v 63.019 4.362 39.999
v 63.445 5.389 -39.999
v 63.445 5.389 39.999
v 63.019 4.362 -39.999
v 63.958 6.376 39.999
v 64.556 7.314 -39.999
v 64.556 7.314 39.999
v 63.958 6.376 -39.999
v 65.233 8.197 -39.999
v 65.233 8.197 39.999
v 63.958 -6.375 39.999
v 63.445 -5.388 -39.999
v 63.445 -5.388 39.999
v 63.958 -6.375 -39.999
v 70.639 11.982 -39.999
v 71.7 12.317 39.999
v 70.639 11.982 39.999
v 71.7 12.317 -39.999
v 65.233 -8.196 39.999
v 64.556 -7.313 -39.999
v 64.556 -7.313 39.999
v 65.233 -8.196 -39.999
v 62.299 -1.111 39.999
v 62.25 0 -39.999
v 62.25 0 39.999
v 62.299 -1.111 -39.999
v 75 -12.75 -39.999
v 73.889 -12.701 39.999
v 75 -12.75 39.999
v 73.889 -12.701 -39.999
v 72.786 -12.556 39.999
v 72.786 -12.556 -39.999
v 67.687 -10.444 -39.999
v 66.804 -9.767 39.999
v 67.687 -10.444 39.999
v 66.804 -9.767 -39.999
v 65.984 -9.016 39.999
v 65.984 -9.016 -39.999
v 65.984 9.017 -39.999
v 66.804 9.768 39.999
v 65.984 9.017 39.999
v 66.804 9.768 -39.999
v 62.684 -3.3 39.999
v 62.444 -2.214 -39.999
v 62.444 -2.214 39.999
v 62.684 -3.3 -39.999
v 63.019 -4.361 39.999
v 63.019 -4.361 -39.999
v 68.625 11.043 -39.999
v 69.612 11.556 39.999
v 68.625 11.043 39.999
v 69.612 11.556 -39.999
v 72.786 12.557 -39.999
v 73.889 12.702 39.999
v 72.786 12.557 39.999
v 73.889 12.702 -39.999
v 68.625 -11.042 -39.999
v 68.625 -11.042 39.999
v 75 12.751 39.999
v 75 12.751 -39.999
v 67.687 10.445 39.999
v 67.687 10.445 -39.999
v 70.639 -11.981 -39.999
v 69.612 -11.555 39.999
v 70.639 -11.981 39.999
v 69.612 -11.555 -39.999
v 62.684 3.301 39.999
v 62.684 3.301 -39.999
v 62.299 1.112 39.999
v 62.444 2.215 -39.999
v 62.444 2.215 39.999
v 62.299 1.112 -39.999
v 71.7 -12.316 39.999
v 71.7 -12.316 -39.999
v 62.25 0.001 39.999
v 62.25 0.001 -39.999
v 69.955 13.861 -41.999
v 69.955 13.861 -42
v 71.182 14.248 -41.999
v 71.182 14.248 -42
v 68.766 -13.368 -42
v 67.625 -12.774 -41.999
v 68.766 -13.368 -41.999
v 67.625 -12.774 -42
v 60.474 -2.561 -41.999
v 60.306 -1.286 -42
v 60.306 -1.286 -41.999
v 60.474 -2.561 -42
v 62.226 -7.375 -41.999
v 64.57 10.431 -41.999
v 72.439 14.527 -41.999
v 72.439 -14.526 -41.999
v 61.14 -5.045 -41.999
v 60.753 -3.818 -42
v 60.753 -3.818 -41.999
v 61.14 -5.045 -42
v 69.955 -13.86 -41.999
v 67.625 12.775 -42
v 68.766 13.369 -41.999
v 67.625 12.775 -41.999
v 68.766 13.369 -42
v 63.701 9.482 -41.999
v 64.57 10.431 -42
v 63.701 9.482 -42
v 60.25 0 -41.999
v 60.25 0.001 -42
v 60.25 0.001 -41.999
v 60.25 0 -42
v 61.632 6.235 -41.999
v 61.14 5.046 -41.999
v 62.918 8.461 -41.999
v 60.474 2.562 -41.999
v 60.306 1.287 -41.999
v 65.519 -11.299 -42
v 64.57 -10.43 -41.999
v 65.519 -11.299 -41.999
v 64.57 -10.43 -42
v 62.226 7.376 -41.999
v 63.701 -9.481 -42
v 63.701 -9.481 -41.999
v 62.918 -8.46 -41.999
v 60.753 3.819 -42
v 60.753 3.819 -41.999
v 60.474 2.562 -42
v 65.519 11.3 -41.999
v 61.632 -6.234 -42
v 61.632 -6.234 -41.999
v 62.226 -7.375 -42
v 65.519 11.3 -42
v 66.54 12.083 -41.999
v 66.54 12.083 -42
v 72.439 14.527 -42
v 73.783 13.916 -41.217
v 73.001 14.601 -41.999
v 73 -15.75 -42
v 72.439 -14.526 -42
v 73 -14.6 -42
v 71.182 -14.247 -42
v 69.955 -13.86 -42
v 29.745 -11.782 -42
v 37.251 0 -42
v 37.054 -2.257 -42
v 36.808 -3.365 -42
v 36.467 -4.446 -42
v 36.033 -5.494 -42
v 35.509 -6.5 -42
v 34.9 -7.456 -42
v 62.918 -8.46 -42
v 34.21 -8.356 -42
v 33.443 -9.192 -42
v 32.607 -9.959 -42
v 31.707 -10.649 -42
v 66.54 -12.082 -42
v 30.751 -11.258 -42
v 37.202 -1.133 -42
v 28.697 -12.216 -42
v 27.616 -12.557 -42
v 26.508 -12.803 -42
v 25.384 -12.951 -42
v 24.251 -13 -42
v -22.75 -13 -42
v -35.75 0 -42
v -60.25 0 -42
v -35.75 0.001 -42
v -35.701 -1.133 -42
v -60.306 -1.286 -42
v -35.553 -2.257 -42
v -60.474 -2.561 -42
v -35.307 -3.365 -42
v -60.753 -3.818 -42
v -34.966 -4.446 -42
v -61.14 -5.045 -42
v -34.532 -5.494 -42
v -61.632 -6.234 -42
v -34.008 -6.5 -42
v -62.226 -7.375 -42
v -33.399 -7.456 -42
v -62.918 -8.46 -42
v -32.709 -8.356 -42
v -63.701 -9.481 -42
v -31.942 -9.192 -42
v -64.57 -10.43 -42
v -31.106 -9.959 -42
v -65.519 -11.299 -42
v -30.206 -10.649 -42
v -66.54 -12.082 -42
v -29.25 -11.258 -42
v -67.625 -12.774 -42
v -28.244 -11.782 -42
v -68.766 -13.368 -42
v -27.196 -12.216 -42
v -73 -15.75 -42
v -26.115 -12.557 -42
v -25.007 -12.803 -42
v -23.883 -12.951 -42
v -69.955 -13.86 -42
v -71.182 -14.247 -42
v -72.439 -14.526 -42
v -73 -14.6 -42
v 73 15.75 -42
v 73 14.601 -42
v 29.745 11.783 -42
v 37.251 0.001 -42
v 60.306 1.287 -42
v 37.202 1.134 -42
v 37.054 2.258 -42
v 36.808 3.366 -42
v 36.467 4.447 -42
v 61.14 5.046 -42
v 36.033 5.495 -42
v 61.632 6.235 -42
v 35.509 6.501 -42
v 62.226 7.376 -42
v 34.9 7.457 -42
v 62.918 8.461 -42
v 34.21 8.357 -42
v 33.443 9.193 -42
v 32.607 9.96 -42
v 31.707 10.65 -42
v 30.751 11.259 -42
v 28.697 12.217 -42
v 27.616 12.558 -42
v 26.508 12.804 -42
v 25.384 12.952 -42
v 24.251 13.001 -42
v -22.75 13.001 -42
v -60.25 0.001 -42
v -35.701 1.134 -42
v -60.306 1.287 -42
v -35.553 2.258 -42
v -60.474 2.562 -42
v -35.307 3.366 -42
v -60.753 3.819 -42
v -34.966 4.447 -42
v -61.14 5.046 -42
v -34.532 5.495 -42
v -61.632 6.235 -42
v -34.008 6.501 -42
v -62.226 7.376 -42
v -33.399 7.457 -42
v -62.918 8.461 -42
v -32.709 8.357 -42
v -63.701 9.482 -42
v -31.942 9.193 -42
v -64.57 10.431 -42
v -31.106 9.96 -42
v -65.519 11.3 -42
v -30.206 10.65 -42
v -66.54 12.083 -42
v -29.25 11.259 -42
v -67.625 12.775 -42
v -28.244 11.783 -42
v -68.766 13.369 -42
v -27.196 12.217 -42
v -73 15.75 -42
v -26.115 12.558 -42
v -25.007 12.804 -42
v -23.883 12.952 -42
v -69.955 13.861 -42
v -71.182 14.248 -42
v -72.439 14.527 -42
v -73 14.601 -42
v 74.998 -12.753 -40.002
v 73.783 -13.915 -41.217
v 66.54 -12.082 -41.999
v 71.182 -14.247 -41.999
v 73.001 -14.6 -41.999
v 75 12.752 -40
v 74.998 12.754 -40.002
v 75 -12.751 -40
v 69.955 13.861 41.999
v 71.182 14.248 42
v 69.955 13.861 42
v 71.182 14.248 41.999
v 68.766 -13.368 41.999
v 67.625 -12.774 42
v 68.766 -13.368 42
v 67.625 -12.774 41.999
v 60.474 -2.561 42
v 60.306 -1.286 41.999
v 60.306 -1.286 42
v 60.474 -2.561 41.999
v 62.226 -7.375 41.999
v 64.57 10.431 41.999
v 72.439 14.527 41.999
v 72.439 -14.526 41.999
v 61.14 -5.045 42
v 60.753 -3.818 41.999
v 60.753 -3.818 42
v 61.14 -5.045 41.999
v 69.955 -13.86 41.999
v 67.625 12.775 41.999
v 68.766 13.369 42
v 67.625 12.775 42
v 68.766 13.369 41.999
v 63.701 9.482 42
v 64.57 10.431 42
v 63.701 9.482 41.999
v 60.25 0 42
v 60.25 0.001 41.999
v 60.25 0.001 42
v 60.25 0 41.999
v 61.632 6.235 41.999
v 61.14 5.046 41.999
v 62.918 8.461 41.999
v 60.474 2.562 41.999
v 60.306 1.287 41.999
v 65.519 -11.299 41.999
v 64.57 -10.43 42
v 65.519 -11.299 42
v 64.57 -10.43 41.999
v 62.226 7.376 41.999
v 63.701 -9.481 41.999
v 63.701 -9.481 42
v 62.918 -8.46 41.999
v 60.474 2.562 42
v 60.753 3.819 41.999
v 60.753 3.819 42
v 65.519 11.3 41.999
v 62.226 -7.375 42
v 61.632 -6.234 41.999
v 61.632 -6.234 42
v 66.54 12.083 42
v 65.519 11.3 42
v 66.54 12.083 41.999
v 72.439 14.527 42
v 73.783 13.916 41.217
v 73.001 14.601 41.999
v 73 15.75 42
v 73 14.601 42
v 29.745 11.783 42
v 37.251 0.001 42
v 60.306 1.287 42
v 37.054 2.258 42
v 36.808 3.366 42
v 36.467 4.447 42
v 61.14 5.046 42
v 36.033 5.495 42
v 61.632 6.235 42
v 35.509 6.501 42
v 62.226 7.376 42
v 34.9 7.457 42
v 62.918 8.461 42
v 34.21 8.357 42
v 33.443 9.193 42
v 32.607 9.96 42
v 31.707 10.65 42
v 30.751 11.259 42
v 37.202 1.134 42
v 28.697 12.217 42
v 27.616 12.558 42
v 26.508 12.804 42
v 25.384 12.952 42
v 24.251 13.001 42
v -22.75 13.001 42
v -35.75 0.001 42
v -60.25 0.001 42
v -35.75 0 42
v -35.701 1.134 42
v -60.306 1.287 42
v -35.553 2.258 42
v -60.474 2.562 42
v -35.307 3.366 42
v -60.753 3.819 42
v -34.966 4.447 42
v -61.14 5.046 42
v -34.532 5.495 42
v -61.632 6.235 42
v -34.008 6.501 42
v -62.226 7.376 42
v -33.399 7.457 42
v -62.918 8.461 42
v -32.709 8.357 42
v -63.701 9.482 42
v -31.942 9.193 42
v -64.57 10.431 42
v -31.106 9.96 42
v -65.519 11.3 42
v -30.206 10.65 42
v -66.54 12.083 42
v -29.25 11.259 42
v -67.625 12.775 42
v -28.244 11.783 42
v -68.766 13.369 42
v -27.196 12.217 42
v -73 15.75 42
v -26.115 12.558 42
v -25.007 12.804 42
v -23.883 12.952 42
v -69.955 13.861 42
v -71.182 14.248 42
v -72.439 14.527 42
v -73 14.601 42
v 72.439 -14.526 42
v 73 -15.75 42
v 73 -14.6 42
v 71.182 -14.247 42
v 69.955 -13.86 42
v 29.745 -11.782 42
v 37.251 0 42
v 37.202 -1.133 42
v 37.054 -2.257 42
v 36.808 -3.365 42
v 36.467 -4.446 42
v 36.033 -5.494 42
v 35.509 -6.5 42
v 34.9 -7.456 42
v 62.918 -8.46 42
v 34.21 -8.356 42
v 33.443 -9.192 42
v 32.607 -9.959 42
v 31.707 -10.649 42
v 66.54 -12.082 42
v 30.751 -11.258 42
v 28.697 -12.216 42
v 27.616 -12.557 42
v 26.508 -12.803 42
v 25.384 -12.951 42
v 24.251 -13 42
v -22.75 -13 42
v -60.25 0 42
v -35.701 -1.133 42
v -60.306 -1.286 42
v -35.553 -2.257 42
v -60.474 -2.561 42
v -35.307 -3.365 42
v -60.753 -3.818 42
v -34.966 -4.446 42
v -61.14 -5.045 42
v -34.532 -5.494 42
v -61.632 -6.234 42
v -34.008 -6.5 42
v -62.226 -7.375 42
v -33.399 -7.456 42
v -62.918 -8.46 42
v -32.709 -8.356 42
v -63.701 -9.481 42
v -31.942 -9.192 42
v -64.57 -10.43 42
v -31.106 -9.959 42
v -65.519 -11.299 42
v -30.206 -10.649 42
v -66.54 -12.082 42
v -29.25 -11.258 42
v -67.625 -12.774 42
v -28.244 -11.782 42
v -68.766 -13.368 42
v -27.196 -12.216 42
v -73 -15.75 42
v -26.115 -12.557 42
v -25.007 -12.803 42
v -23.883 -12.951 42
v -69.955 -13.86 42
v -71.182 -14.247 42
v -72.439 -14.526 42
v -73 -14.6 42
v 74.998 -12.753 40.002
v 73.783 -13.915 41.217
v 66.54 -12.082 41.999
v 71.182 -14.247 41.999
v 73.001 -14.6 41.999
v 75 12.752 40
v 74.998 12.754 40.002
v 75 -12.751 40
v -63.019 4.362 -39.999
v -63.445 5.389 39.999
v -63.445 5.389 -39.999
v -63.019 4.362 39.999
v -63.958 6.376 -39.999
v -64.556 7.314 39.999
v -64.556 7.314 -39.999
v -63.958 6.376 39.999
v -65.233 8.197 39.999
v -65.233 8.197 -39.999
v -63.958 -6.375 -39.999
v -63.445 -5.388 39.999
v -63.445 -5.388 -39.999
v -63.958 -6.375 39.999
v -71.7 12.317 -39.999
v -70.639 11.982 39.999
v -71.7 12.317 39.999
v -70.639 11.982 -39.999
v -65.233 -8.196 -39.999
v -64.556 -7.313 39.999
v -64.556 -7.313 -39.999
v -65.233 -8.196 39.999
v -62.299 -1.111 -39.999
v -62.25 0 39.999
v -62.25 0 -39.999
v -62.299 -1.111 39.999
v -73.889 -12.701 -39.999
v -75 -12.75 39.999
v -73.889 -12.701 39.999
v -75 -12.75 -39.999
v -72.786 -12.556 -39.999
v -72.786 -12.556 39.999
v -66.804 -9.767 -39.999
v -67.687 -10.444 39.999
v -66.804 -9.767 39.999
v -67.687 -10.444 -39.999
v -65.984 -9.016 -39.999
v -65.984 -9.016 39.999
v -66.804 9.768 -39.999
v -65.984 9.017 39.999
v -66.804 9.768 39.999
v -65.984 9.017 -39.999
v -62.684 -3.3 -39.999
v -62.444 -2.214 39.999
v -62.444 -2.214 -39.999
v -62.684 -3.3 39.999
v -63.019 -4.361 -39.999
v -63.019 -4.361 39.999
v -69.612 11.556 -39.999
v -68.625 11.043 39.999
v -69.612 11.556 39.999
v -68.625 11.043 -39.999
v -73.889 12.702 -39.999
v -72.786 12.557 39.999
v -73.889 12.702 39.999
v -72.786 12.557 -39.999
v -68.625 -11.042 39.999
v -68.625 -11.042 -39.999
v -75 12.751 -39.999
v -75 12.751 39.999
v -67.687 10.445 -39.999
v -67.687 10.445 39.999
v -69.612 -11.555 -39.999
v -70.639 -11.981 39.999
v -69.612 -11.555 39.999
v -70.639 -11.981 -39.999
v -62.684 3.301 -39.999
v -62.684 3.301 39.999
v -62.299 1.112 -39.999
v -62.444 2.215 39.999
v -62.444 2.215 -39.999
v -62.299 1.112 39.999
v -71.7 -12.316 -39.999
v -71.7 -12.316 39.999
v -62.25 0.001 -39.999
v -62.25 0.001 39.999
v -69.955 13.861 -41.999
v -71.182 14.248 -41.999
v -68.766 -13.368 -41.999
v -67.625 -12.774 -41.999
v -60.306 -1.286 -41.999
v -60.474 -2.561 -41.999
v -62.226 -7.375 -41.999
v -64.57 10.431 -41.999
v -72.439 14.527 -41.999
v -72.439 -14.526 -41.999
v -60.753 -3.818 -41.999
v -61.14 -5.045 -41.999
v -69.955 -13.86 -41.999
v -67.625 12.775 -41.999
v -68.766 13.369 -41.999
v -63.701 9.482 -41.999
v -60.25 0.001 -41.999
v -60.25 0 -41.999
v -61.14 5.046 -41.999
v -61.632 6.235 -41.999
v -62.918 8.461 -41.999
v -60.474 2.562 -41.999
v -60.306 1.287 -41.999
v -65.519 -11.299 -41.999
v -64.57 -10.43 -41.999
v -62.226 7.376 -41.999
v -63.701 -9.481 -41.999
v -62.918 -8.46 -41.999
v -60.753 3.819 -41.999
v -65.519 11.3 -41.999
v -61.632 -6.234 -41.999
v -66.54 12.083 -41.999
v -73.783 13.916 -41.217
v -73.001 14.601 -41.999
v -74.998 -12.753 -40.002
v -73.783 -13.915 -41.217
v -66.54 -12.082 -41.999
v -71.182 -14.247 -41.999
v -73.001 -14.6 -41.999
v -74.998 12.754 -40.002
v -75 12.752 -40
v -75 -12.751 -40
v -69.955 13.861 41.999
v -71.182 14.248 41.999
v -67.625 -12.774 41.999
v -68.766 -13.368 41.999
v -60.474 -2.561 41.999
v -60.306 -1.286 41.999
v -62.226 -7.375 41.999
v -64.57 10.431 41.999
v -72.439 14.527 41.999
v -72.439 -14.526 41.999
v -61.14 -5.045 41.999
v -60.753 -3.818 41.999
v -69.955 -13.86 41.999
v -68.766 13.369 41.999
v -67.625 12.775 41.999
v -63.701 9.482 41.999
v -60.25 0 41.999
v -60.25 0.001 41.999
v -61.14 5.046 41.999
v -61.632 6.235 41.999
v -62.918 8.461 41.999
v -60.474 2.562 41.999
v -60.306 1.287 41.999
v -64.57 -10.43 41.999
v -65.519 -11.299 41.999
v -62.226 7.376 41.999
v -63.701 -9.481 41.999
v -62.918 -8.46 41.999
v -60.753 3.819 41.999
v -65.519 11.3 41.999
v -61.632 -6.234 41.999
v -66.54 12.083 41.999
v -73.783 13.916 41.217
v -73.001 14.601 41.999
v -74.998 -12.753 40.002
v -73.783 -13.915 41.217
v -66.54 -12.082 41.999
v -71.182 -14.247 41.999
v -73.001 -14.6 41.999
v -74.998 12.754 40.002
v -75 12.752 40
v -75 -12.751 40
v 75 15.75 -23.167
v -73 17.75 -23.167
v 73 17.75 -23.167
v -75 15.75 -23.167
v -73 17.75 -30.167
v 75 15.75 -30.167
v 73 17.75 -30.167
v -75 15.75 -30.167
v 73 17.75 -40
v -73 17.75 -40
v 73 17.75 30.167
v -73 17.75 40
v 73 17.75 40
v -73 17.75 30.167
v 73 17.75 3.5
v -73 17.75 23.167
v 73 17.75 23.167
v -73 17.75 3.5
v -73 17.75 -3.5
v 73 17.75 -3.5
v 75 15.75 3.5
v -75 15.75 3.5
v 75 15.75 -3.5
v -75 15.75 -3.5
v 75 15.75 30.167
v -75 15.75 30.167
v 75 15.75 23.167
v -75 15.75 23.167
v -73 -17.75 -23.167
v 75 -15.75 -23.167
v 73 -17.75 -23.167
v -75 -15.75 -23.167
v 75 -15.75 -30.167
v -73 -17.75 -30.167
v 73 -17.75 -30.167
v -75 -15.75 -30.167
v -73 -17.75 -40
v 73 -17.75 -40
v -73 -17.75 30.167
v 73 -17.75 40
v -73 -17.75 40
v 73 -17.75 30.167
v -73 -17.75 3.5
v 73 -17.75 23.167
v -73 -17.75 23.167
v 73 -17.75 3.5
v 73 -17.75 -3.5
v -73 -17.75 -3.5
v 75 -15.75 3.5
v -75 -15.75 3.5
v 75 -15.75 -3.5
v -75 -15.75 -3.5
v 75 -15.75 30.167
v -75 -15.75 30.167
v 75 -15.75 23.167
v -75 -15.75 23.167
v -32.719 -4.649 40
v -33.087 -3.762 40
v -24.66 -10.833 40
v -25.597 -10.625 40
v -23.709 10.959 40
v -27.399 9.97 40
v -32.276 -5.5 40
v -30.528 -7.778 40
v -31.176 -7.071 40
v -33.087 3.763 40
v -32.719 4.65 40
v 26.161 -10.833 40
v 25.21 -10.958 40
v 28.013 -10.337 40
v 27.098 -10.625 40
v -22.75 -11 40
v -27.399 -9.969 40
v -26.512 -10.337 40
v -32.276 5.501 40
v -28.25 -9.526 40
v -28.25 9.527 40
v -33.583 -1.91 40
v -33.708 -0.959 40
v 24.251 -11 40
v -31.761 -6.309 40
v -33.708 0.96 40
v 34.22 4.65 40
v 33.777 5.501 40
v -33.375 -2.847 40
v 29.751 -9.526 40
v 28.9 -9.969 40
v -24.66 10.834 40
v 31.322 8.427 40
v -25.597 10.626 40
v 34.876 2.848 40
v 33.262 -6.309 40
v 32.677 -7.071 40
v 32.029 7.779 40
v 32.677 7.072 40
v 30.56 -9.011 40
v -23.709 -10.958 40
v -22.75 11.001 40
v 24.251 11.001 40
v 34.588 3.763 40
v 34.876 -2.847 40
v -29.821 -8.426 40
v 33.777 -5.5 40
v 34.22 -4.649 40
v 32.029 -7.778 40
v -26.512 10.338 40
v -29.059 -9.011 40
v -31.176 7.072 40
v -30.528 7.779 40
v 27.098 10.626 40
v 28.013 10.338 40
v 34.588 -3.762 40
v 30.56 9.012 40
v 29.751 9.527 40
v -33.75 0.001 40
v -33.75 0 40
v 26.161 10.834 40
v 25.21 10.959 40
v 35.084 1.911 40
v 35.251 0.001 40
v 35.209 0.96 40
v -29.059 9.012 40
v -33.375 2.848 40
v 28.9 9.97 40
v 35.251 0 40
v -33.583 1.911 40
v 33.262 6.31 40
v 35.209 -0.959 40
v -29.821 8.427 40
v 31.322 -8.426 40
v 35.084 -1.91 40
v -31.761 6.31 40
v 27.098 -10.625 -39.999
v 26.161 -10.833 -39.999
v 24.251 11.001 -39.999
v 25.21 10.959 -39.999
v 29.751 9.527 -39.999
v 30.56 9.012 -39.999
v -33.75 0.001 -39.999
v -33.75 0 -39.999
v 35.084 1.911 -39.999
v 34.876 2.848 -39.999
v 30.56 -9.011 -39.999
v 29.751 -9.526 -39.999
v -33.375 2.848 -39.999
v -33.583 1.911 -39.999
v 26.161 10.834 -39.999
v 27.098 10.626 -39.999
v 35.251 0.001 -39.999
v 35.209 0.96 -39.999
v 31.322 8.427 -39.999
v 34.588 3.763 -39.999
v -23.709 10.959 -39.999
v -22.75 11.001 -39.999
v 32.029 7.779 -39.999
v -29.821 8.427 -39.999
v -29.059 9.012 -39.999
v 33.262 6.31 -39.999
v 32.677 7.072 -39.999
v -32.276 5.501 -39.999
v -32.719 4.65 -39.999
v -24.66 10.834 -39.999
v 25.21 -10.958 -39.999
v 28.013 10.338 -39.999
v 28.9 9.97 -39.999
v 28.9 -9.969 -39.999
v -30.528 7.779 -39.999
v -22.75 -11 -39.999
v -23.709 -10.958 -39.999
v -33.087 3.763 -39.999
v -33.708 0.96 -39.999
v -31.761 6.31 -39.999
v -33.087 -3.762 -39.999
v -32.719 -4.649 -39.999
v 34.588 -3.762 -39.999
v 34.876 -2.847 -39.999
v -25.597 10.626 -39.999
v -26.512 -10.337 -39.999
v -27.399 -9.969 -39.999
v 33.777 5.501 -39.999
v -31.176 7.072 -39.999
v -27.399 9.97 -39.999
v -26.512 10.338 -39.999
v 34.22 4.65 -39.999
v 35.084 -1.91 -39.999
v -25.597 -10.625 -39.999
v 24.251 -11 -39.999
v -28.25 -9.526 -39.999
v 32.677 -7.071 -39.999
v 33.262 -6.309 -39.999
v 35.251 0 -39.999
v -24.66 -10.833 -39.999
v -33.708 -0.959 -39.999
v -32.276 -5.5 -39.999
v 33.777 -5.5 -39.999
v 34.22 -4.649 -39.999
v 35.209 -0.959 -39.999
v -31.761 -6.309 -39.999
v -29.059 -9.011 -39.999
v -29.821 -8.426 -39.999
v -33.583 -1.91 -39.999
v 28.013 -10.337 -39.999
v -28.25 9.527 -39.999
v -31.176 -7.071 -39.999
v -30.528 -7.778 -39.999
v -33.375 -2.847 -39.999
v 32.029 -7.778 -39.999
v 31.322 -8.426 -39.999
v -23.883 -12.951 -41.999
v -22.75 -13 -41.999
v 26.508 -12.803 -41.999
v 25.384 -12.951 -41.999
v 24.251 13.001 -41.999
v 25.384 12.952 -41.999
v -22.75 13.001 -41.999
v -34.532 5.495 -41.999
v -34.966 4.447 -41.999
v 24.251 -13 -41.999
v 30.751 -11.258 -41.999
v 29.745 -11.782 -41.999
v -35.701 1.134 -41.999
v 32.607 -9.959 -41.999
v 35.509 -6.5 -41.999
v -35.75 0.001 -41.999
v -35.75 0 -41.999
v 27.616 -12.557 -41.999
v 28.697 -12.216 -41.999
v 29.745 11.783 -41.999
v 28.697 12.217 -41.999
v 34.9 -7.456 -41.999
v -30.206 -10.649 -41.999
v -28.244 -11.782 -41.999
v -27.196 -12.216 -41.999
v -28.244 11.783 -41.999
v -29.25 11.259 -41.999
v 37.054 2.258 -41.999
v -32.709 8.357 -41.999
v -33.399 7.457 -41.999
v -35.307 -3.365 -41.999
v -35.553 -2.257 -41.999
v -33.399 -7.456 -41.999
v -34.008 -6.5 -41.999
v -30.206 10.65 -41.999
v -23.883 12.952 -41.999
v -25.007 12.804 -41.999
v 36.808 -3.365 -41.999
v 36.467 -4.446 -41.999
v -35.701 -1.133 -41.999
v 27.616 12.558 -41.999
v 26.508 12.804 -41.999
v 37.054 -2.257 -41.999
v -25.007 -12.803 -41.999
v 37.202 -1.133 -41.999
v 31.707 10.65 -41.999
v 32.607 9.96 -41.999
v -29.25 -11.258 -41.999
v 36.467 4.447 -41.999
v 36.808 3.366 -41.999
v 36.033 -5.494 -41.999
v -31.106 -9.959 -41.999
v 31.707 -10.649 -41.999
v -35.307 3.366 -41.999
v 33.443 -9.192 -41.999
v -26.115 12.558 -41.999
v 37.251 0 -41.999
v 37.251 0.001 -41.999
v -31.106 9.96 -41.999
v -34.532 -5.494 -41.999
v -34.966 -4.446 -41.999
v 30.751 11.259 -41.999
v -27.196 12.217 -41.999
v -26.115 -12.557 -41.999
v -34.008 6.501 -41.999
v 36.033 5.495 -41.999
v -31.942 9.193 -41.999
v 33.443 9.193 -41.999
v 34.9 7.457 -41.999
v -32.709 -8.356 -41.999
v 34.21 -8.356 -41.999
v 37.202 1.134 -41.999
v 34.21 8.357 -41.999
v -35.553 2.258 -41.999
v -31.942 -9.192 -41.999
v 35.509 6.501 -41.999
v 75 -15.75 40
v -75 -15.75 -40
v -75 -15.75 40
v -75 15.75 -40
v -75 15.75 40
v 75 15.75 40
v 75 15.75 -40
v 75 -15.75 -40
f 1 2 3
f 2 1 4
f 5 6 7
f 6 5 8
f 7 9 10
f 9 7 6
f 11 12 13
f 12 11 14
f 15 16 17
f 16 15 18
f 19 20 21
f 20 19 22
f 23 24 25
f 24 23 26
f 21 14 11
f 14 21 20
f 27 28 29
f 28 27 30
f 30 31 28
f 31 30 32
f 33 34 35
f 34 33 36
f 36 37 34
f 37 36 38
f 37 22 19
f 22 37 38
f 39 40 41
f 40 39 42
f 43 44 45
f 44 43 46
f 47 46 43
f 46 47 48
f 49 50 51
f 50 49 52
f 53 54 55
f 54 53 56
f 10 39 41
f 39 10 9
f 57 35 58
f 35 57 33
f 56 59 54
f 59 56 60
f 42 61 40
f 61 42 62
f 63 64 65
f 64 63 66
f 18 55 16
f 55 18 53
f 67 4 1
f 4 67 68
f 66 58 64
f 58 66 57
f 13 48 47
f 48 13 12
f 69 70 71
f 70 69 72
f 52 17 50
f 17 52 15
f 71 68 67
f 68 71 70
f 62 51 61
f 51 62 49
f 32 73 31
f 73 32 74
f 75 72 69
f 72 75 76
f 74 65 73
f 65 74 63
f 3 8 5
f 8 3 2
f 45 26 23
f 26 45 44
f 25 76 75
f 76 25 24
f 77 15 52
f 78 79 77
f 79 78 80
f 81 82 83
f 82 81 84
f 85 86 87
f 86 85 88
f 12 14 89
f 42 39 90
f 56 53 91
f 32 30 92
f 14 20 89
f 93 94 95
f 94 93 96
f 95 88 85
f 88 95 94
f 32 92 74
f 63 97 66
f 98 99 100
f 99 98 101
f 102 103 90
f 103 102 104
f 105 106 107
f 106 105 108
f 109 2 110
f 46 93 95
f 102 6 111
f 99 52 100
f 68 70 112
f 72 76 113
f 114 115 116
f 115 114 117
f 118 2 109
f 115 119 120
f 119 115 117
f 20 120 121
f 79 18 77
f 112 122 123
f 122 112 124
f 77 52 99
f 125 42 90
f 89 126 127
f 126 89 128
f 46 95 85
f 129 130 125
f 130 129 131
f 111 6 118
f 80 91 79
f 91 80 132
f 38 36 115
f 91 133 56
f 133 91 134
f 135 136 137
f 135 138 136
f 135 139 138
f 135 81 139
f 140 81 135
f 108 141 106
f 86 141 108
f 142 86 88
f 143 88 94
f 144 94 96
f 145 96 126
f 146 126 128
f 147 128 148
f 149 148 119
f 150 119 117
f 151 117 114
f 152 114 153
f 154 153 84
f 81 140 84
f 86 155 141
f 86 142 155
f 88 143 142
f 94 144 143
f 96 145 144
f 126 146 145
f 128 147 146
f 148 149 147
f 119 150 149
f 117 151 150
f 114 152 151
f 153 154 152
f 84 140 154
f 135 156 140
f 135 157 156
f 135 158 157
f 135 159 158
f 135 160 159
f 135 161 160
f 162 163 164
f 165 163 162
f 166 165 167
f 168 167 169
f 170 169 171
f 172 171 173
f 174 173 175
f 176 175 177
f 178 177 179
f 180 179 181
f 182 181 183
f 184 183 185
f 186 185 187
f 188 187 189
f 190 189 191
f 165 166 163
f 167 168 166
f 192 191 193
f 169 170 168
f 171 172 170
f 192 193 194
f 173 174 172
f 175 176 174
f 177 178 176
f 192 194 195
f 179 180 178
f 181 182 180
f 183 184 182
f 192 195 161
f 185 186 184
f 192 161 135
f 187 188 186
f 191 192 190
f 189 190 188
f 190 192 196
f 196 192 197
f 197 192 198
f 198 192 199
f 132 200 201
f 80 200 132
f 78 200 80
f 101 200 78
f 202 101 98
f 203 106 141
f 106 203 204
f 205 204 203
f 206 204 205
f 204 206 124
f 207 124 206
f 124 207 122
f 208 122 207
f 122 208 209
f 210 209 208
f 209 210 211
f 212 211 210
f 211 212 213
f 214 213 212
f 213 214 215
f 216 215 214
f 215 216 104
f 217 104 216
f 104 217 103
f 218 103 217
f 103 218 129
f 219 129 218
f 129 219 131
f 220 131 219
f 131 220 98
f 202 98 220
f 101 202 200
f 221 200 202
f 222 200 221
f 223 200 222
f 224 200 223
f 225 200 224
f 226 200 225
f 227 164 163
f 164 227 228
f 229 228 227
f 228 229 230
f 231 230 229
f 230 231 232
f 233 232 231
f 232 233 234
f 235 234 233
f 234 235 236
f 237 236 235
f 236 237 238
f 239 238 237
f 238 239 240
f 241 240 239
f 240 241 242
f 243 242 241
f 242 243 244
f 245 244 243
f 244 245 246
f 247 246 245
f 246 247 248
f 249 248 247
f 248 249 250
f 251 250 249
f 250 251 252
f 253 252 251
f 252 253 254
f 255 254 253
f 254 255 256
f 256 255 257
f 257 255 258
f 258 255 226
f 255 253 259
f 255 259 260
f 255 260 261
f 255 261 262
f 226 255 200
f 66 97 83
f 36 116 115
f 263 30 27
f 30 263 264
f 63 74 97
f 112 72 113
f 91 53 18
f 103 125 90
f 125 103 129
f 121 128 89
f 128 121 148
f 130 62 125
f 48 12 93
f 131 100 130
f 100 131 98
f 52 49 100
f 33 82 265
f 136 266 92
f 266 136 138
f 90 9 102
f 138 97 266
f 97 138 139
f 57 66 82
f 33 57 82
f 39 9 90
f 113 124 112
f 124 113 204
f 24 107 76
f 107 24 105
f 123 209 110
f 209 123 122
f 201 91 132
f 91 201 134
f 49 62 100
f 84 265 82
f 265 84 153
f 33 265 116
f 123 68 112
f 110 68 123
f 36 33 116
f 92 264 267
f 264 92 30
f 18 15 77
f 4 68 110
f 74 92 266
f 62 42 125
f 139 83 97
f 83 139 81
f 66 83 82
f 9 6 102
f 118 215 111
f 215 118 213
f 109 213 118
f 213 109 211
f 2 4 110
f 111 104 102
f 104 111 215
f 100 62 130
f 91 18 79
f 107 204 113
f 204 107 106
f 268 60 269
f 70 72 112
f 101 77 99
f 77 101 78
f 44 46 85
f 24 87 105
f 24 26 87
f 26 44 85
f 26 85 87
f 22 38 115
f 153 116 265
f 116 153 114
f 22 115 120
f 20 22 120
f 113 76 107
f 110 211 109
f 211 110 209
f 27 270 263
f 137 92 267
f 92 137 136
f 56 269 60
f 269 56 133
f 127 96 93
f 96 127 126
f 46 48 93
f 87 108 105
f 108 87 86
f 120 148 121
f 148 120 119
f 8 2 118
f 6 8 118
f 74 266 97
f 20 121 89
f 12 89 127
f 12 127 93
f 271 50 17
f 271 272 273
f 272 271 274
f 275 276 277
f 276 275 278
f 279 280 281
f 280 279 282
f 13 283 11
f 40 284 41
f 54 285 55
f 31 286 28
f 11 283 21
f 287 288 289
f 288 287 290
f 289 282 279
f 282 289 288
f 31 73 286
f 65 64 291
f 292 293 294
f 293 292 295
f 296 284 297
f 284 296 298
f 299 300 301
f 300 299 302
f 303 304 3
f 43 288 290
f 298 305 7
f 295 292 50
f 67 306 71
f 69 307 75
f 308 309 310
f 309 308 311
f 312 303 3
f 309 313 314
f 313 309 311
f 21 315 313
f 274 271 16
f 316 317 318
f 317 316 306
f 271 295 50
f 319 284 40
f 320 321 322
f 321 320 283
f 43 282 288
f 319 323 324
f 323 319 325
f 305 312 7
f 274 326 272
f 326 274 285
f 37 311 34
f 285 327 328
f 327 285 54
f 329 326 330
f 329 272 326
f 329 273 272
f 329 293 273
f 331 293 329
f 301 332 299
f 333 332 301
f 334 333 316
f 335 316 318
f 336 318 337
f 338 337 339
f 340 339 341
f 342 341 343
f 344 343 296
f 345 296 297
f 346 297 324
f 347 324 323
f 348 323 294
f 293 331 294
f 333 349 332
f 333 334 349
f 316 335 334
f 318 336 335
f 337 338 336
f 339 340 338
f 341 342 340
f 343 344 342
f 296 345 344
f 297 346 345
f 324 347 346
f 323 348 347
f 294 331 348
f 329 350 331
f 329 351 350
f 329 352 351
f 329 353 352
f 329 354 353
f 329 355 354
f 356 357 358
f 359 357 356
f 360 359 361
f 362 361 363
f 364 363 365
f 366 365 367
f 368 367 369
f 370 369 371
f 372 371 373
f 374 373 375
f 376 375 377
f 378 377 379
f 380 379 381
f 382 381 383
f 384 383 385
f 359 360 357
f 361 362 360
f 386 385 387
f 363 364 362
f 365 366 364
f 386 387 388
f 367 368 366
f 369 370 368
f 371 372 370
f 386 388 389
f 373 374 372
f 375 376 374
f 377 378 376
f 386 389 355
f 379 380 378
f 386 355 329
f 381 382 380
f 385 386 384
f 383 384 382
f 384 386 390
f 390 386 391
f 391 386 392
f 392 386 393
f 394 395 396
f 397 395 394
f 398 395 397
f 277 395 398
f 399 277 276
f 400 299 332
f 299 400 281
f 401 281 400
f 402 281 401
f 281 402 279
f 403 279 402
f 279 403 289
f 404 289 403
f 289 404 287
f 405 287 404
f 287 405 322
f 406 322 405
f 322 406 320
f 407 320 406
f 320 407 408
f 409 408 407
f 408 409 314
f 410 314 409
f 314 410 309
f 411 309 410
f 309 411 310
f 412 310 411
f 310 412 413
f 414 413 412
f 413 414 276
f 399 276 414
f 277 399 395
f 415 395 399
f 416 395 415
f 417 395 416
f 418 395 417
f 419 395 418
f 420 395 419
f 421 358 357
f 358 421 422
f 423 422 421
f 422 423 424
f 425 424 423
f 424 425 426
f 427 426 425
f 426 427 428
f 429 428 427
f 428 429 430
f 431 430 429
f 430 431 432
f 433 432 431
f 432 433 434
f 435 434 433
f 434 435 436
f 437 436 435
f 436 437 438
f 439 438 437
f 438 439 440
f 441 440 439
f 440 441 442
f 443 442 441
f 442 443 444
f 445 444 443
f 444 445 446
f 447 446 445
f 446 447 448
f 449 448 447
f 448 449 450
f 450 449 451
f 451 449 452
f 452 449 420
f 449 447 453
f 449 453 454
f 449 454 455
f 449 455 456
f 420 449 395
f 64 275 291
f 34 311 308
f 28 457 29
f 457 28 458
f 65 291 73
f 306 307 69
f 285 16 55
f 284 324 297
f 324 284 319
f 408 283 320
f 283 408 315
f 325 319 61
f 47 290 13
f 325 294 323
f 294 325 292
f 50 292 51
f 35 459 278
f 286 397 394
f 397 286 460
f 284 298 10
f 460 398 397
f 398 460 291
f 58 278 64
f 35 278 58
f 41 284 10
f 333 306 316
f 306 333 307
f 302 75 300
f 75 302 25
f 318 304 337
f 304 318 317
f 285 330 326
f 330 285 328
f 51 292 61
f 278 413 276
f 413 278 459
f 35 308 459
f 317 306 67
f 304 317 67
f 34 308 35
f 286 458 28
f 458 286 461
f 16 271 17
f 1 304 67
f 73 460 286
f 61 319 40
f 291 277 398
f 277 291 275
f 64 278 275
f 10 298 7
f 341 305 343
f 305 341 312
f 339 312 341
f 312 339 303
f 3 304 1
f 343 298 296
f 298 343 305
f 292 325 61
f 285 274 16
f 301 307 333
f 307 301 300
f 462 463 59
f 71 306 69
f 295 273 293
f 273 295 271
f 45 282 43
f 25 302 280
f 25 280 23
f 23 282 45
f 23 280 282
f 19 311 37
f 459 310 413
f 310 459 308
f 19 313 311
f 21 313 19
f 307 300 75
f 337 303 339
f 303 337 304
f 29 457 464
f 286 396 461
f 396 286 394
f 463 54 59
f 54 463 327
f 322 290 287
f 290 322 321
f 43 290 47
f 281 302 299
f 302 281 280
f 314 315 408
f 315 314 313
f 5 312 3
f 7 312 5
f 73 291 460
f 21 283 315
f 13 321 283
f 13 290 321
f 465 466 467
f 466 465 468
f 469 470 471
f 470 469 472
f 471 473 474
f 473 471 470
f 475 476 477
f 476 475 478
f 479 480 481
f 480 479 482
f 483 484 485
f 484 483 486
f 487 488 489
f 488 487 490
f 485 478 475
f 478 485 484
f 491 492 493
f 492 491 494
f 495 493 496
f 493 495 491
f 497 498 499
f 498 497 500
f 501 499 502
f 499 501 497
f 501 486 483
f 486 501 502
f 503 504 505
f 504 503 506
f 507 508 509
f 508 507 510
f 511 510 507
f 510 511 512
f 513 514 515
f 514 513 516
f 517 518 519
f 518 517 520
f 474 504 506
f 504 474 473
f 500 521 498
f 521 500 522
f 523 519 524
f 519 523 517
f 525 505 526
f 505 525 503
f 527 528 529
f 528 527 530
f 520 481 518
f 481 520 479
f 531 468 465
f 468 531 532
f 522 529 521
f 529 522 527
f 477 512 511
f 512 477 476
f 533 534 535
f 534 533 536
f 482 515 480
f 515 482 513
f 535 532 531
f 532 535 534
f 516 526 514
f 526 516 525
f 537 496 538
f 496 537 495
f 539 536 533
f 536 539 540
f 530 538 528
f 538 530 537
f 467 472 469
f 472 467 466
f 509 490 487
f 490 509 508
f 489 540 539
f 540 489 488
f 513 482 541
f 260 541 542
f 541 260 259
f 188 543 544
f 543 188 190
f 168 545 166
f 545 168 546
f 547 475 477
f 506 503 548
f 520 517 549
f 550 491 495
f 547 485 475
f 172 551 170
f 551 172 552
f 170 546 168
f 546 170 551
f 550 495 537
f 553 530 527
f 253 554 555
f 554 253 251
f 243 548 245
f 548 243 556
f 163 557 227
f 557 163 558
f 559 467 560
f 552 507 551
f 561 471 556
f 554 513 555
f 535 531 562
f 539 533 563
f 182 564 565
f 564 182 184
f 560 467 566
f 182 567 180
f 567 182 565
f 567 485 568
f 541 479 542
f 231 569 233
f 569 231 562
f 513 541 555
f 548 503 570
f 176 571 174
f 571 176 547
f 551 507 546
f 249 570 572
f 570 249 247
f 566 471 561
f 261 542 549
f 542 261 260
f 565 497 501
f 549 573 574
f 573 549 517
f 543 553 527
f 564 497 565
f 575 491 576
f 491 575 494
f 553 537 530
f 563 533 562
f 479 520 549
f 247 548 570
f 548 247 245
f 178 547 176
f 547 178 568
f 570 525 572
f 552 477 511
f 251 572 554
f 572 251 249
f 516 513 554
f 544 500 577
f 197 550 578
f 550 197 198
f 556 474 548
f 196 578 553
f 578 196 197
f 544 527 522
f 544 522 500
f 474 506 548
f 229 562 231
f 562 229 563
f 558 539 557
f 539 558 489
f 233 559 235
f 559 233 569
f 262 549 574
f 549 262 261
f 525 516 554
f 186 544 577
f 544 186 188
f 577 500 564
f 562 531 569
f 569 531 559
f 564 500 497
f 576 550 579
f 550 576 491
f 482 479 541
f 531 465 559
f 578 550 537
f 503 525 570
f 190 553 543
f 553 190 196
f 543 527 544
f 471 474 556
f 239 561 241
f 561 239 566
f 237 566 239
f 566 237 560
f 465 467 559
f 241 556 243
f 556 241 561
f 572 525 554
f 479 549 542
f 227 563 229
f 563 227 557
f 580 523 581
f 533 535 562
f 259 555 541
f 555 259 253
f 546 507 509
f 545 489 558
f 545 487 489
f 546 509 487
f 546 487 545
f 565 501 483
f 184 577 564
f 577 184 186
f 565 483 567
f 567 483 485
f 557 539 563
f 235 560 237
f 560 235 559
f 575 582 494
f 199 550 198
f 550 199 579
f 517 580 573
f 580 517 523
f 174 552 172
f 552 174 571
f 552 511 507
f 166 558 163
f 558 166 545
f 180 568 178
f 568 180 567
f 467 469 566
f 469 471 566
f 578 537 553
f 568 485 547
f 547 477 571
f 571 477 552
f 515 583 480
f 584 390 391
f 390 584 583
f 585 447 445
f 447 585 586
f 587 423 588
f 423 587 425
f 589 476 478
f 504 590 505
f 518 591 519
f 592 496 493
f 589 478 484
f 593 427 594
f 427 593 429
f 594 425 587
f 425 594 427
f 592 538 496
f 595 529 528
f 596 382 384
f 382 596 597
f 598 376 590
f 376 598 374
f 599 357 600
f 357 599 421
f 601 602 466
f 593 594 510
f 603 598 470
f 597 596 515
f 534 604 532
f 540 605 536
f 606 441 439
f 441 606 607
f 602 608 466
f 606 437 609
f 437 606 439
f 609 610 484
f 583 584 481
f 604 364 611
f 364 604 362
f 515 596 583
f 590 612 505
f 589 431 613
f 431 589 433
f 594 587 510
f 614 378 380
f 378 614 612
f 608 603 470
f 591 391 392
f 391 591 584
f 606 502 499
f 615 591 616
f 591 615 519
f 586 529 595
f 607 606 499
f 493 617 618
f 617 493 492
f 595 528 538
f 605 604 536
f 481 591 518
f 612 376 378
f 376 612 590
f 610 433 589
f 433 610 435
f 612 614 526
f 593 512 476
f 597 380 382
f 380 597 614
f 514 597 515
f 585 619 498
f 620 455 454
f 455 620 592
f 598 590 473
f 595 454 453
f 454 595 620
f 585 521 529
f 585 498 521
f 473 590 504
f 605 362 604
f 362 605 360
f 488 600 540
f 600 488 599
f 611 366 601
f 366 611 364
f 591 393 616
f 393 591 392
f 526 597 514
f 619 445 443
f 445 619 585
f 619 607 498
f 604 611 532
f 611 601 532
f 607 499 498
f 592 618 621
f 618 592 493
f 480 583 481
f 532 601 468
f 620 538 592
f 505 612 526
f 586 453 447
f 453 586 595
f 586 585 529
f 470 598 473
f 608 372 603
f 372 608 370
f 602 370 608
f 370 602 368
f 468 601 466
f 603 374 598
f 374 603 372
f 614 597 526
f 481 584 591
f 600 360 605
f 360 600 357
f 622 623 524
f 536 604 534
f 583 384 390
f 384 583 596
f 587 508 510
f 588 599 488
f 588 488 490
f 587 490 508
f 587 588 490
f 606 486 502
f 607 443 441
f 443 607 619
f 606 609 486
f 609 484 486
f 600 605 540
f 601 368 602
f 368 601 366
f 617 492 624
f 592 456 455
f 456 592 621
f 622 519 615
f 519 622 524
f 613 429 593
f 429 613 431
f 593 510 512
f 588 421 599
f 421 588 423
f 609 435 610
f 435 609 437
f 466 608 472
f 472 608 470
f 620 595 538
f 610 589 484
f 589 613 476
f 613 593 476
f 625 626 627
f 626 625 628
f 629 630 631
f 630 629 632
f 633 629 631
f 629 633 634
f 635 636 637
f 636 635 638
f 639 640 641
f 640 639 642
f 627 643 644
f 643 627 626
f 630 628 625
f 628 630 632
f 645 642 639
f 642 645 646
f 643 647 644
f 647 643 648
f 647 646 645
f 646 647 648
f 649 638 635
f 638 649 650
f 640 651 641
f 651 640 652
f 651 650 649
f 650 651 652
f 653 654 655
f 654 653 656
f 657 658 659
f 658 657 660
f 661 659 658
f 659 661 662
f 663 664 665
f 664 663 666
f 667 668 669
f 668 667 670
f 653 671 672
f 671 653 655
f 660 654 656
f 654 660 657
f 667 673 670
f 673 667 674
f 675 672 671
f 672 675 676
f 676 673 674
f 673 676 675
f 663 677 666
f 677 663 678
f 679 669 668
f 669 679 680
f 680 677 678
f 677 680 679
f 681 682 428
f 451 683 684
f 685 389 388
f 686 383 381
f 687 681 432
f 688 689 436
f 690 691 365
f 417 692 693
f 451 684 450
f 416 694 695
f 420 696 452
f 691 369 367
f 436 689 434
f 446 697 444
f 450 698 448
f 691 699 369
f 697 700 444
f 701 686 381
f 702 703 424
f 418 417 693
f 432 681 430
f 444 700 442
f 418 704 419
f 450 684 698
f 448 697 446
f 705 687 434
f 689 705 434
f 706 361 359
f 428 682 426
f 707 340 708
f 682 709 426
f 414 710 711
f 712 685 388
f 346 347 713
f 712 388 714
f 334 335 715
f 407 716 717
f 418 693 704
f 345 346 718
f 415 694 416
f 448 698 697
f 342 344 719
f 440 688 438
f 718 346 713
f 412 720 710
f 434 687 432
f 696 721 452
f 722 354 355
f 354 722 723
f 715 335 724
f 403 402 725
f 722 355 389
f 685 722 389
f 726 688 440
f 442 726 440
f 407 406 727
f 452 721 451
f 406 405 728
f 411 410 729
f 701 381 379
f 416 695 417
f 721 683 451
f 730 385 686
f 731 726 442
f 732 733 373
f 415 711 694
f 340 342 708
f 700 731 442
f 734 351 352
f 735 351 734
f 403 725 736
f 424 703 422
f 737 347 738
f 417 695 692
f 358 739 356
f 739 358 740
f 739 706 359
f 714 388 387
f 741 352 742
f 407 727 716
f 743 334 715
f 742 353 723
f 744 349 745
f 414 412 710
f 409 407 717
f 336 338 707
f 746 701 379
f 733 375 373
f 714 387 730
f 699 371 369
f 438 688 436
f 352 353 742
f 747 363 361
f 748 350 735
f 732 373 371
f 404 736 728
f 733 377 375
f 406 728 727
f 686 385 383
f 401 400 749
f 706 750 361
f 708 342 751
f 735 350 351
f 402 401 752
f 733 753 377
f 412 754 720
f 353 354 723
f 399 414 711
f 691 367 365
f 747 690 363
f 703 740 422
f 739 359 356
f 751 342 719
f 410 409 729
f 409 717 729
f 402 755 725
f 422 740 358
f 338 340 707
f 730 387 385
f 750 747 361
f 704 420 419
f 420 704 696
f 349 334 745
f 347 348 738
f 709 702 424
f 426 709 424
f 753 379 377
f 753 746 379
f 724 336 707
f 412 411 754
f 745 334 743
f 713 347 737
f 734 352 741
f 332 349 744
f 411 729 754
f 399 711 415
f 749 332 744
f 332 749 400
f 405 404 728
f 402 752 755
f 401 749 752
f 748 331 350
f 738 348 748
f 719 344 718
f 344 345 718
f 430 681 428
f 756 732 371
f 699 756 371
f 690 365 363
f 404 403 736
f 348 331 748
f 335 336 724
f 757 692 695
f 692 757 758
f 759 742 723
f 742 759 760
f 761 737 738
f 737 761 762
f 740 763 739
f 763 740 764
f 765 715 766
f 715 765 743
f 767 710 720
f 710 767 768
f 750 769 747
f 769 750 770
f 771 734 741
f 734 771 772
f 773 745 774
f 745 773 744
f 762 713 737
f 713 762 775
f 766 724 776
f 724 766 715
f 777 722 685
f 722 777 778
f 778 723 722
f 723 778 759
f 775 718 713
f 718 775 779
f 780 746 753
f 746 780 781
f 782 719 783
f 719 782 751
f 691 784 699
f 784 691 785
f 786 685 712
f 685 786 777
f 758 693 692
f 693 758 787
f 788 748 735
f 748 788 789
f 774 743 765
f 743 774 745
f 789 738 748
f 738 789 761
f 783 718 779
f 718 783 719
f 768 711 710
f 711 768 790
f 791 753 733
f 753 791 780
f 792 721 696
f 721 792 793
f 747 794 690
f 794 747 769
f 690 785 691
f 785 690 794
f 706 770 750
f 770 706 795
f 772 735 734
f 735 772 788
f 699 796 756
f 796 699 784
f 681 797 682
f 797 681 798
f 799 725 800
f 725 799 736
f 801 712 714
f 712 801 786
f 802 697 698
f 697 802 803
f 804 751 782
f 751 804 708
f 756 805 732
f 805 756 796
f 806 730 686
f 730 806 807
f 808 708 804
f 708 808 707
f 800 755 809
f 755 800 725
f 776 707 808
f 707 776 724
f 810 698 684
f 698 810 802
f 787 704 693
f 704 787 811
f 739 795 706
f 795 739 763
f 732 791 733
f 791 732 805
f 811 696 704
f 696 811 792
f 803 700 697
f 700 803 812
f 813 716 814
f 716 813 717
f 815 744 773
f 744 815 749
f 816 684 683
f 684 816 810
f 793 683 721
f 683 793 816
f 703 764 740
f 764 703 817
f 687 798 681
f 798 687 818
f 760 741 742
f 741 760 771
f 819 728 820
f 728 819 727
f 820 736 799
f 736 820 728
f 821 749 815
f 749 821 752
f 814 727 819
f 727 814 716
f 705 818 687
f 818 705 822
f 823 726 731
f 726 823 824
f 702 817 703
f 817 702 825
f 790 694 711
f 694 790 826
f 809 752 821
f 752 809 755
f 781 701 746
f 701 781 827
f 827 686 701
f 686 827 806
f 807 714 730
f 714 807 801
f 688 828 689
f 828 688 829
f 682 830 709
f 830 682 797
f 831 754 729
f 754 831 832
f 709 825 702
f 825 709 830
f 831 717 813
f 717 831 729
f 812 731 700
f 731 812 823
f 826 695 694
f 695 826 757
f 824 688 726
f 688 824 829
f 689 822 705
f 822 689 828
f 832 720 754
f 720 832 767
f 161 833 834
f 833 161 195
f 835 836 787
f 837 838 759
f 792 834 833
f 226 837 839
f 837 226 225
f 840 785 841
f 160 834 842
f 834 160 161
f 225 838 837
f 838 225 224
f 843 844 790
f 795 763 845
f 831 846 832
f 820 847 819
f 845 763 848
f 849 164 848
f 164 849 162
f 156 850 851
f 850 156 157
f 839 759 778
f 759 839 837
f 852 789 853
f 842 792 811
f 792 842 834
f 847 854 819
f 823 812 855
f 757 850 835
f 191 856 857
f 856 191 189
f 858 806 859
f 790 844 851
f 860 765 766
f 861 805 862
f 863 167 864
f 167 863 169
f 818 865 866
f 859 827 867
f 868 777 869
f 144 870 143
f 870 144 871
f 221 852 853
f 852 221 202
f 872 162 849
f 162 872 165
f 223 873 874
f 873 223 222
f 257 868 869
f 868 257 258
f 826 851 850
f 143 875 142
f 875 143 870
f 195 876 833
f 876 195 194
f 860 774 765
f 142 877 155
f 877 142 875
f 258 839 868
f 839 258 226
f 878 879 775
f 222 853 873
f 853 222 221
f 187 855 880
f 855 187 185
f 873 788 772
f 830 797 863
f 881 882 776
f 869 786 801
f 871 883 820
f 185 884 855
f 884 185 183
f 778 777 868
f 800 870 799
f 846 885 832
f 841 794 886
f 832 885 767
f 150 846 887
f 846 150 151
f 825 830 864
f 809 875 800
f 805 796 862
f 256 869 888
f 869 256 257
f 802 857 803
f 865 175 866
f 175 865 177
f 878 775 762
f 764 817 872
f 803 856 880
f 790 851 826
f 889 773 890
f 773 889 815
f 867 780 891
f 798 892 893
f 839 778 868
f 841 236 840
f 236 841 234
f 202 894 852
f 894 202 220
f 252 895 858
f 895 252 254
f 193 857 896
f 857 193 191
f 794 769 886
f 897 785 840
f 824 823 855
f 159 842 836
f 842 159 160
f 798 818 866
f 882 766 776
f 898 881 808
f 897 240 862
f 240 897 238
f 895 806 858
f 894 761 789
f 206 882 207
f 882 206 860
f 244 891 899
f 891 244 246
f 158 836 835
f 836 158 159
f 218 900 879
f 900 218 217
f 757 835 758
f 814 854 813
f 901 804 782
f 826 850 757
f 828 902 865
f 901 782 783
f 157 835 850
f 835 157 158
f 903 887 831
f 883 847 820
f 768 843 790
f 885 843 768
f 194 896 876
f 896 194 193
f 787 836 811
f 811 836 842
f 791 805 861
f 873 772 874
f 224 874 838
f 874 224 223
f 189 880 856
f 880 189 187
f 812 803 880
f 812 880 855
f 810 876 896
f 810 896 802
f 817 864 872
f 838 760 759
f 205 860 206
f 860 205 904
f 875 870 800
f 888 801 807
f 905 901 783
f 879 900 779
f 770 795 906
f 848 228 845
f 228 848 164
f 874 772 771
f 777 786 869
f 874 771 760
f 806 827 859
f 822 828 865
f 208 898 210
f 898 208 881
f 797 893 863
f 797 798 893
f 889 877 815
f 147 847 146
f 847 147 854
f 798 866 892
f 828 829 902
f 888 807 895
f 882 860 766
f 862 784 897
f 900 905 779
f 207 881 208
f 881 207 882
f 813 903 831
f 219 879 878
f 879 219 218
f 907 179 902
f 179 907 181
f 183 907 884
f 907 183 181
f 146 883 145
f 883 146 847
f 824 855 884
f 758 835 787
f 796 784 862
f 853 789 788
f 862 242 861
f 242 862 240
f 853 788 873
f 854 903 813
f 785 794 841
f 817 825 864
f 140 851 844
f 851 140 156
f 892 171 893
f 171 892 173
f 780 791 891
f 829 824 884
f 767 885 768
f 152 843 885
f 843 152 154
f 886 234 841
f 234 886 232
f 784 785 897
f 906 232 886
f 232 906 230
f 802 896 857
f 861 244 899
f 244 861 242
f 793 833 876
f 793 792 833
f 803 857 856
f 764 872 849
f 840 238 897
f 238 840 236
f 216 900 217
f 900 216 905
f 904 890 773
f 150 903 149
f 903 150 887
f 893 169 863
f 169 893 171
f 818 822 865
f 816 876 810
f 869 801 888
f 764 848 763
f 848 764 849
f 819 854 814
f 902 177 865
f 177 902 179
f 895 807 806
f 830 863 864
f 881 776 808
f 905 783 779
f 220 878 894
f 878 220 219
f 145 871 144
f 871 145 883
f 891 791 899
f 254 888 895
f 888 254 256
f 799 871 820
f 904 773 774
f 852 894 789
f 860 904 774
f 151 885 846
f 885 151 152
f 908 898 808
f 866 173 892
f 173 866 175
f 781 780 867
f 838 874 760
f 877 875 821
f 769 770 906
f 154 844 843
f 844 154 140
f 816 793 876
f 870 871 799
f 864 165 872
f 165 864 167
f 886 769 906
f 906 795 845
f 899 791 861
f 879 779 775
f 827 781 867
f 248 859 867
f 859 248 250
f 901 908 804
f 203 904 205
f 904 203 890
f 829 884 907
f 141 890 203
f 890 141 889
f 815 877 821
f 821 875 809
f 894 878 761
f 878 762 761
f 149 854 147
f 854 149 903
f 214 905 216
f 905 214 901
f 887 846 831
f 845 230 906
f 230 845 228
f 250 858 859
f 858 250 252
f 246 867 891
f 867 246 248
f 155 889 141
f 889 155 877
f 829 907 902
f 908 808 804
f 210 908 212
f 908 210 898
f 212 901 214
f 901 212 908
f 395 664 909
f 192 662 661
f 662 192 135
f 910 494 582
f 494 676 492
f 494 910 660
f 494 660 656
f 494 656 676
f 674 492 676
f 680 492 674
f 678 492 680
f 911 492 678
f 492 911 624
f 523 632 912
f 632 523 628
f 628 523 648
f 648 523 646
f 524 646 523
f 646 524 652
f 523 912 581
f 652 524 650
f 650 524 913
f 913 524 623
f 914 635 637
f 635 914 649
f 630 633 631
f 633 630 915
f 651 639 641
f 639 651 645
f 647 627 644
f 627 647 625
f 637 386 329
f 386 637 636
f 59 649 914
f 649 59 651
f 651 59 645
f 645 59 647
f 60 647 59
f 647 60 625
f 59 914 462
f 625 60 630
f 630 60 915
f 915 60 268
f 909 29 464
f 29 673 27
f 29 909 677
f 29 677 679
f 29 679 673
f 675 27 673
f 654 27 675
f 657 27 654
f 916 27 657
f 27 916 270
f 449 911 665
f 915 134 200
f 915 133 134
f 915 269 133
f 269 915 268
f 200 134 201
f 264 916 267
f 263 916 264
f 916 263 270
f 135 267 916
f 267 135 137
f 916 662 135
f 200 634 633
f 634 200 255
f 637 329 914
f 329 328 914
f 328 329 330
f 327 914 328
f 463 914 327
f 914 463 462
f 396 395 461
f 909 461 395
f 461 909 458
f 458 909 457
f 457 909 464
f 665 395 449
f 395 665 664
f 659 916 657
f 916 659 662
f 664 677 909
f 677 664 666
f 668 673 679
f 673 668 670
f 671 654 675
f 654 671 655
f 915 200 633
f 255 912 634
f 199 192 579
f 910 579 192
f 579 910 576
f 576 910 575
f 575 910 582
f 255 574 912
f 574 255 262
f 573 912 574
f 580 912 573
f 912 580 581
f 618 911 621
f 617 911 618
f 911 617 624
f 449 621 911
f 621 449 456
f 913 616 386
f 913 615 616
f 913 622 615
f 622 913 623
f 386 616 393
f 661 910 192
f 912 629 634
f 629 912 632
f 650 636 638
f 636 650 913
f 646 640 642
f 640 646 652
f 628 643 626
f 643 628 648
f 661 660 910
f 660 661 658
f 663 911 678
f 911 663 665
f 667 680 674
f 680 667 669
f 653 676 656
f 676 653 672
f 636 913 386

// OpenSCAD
/*
 * Copyright ©2015 Laurence Gonsalves <laurence@xenomachina.com>
 *
 * This library is free software; you can redistribute it and/or
 * modify it under the terms of the GNU Lesser General Public
 * License as published by the Free Software Foundation; either
 * version 2.1 of the License, or any later version.
 *
 * This library is distributed in the hope that it will be useful,
 * but WITHOUT ANY WARRANTY; without even the implied warranty of
 * MERCHANTABILITY or FITNESS FOR A PARTICULAR PURPOSE.  See the GNU
 * Lesser General Public License for more details.
 *
 * You should have received a copy of the GNU Lesser General Public
 * License along with this library; if not, write to:
 *   Free Software Foundation, Inc.
 *   51 Franklin Street, Fifth Floor
 *   Boston, MA  02110-1301
 *   USA
 */

//////////////////////////////////////////////////////////////////////////////
// NOTE: I haven't actually printed this yet, so it's a completely untested
// design.
//
// I have two Monoprice monitor stands that each have a vertical shaft that
// mounts onto the desk. My desk has a cable port in the center, so rather than
// have the stands mounted centered under their respective monitor, I have them
// mounted on either side of this port. This off-center placement means the two
// stands tend to bow away from each other slightly, but noticeably.
//
// This design is a "bridge" that goes between the two monitor stands. It would
// be held in place by cable ties. There is a "tunnel" through the center for
// cable management.
//
// As mentioned earlier, I have not printed this yet. For now I'm just using
// cable ties, which prevents the bowing, but it does mean that my monitors can
// wobble a tiny bit (mostly noticeable from the webcam mounted on top of one
// of my monitors., so I may end up printing this after all, as it should make
// the setup a lot more rigid than it currently is.
//
// Caveats aside, for the most part I think this design should work well, but
// the measurements will most certainly need adjusting for different mounts
// diameters, mount placements, and cable tie widths.
//////////////////////////////////////////////////////////////////////////////


$fn=72;

guide_r = 11;
guide_width = 69;
pipe_r = 25.5/2;
pipe_spacing = 150;
edge_r = 2;
height = 80;
strap_width = 7;
num_straps = 3;
e = 0.001;
depth = pipe_r * 2 + 6;

module main() {
    difference() {
        // bevelled box
        hull() {
            for(axis=[[1,0,0],[0,1,0],[0,0,1]])
                cube([pipe_spacing - edge_r*2, depth, height] + 2 * edge_r * axis,
                     center=true);
        }

        union() {
            // pipe slots with bevelled ends
            for(xs=[1,-1])
                for(zs=[1,-1])
                    scale([xs,1,zs]) {
                        translate([pipe_spacing/2, 0, -height/2]) {
                            minkowski() {
                                union() {
                                    cylinder(r=pipe_r, h=height);
                                    translate([0,0,-edge_r]) cylinder(r1=pipe_r + edge_r,r2=pipe_r, h=edge_r);
                                }
                                cube([pipe_r, e, e]);
                            }
                        }
                    }

            // strap slots
            for(ys=[1,-1])
                scale([1,ys,1])
                    for(i=[1:num_straps])
                        translate([-pipe_spacing/2 - edge_r, depth/2,
                                  -height/num_straps/2-height / 2 + height / num_straps * i - strap_width / 2])
                            cube([pipe_spacing + 2 * edge_r, edge_r, strap_width]);

            // cable guides
            minkowski() {
                translate([-1/2 *(guide_width/2 + guide_r), 0, -height/2]) 
                    union() {
                        cylinder(r=guide_r, h=height + 2 * edge_r + 2*e);
                        translate([0,0,-edge_r]) cylinder(r1=guide_r + edge_r,r2=guide_r, h=edge_r);
                        translate([0,0,height]) cylinder(r2=guide_r + edge_r,r1=guide_r, h=edge_r);
                    }
                cube([e + 1*(guide_width - 2*guide_r), e, e]);
            }
        }
    }
}

main();
